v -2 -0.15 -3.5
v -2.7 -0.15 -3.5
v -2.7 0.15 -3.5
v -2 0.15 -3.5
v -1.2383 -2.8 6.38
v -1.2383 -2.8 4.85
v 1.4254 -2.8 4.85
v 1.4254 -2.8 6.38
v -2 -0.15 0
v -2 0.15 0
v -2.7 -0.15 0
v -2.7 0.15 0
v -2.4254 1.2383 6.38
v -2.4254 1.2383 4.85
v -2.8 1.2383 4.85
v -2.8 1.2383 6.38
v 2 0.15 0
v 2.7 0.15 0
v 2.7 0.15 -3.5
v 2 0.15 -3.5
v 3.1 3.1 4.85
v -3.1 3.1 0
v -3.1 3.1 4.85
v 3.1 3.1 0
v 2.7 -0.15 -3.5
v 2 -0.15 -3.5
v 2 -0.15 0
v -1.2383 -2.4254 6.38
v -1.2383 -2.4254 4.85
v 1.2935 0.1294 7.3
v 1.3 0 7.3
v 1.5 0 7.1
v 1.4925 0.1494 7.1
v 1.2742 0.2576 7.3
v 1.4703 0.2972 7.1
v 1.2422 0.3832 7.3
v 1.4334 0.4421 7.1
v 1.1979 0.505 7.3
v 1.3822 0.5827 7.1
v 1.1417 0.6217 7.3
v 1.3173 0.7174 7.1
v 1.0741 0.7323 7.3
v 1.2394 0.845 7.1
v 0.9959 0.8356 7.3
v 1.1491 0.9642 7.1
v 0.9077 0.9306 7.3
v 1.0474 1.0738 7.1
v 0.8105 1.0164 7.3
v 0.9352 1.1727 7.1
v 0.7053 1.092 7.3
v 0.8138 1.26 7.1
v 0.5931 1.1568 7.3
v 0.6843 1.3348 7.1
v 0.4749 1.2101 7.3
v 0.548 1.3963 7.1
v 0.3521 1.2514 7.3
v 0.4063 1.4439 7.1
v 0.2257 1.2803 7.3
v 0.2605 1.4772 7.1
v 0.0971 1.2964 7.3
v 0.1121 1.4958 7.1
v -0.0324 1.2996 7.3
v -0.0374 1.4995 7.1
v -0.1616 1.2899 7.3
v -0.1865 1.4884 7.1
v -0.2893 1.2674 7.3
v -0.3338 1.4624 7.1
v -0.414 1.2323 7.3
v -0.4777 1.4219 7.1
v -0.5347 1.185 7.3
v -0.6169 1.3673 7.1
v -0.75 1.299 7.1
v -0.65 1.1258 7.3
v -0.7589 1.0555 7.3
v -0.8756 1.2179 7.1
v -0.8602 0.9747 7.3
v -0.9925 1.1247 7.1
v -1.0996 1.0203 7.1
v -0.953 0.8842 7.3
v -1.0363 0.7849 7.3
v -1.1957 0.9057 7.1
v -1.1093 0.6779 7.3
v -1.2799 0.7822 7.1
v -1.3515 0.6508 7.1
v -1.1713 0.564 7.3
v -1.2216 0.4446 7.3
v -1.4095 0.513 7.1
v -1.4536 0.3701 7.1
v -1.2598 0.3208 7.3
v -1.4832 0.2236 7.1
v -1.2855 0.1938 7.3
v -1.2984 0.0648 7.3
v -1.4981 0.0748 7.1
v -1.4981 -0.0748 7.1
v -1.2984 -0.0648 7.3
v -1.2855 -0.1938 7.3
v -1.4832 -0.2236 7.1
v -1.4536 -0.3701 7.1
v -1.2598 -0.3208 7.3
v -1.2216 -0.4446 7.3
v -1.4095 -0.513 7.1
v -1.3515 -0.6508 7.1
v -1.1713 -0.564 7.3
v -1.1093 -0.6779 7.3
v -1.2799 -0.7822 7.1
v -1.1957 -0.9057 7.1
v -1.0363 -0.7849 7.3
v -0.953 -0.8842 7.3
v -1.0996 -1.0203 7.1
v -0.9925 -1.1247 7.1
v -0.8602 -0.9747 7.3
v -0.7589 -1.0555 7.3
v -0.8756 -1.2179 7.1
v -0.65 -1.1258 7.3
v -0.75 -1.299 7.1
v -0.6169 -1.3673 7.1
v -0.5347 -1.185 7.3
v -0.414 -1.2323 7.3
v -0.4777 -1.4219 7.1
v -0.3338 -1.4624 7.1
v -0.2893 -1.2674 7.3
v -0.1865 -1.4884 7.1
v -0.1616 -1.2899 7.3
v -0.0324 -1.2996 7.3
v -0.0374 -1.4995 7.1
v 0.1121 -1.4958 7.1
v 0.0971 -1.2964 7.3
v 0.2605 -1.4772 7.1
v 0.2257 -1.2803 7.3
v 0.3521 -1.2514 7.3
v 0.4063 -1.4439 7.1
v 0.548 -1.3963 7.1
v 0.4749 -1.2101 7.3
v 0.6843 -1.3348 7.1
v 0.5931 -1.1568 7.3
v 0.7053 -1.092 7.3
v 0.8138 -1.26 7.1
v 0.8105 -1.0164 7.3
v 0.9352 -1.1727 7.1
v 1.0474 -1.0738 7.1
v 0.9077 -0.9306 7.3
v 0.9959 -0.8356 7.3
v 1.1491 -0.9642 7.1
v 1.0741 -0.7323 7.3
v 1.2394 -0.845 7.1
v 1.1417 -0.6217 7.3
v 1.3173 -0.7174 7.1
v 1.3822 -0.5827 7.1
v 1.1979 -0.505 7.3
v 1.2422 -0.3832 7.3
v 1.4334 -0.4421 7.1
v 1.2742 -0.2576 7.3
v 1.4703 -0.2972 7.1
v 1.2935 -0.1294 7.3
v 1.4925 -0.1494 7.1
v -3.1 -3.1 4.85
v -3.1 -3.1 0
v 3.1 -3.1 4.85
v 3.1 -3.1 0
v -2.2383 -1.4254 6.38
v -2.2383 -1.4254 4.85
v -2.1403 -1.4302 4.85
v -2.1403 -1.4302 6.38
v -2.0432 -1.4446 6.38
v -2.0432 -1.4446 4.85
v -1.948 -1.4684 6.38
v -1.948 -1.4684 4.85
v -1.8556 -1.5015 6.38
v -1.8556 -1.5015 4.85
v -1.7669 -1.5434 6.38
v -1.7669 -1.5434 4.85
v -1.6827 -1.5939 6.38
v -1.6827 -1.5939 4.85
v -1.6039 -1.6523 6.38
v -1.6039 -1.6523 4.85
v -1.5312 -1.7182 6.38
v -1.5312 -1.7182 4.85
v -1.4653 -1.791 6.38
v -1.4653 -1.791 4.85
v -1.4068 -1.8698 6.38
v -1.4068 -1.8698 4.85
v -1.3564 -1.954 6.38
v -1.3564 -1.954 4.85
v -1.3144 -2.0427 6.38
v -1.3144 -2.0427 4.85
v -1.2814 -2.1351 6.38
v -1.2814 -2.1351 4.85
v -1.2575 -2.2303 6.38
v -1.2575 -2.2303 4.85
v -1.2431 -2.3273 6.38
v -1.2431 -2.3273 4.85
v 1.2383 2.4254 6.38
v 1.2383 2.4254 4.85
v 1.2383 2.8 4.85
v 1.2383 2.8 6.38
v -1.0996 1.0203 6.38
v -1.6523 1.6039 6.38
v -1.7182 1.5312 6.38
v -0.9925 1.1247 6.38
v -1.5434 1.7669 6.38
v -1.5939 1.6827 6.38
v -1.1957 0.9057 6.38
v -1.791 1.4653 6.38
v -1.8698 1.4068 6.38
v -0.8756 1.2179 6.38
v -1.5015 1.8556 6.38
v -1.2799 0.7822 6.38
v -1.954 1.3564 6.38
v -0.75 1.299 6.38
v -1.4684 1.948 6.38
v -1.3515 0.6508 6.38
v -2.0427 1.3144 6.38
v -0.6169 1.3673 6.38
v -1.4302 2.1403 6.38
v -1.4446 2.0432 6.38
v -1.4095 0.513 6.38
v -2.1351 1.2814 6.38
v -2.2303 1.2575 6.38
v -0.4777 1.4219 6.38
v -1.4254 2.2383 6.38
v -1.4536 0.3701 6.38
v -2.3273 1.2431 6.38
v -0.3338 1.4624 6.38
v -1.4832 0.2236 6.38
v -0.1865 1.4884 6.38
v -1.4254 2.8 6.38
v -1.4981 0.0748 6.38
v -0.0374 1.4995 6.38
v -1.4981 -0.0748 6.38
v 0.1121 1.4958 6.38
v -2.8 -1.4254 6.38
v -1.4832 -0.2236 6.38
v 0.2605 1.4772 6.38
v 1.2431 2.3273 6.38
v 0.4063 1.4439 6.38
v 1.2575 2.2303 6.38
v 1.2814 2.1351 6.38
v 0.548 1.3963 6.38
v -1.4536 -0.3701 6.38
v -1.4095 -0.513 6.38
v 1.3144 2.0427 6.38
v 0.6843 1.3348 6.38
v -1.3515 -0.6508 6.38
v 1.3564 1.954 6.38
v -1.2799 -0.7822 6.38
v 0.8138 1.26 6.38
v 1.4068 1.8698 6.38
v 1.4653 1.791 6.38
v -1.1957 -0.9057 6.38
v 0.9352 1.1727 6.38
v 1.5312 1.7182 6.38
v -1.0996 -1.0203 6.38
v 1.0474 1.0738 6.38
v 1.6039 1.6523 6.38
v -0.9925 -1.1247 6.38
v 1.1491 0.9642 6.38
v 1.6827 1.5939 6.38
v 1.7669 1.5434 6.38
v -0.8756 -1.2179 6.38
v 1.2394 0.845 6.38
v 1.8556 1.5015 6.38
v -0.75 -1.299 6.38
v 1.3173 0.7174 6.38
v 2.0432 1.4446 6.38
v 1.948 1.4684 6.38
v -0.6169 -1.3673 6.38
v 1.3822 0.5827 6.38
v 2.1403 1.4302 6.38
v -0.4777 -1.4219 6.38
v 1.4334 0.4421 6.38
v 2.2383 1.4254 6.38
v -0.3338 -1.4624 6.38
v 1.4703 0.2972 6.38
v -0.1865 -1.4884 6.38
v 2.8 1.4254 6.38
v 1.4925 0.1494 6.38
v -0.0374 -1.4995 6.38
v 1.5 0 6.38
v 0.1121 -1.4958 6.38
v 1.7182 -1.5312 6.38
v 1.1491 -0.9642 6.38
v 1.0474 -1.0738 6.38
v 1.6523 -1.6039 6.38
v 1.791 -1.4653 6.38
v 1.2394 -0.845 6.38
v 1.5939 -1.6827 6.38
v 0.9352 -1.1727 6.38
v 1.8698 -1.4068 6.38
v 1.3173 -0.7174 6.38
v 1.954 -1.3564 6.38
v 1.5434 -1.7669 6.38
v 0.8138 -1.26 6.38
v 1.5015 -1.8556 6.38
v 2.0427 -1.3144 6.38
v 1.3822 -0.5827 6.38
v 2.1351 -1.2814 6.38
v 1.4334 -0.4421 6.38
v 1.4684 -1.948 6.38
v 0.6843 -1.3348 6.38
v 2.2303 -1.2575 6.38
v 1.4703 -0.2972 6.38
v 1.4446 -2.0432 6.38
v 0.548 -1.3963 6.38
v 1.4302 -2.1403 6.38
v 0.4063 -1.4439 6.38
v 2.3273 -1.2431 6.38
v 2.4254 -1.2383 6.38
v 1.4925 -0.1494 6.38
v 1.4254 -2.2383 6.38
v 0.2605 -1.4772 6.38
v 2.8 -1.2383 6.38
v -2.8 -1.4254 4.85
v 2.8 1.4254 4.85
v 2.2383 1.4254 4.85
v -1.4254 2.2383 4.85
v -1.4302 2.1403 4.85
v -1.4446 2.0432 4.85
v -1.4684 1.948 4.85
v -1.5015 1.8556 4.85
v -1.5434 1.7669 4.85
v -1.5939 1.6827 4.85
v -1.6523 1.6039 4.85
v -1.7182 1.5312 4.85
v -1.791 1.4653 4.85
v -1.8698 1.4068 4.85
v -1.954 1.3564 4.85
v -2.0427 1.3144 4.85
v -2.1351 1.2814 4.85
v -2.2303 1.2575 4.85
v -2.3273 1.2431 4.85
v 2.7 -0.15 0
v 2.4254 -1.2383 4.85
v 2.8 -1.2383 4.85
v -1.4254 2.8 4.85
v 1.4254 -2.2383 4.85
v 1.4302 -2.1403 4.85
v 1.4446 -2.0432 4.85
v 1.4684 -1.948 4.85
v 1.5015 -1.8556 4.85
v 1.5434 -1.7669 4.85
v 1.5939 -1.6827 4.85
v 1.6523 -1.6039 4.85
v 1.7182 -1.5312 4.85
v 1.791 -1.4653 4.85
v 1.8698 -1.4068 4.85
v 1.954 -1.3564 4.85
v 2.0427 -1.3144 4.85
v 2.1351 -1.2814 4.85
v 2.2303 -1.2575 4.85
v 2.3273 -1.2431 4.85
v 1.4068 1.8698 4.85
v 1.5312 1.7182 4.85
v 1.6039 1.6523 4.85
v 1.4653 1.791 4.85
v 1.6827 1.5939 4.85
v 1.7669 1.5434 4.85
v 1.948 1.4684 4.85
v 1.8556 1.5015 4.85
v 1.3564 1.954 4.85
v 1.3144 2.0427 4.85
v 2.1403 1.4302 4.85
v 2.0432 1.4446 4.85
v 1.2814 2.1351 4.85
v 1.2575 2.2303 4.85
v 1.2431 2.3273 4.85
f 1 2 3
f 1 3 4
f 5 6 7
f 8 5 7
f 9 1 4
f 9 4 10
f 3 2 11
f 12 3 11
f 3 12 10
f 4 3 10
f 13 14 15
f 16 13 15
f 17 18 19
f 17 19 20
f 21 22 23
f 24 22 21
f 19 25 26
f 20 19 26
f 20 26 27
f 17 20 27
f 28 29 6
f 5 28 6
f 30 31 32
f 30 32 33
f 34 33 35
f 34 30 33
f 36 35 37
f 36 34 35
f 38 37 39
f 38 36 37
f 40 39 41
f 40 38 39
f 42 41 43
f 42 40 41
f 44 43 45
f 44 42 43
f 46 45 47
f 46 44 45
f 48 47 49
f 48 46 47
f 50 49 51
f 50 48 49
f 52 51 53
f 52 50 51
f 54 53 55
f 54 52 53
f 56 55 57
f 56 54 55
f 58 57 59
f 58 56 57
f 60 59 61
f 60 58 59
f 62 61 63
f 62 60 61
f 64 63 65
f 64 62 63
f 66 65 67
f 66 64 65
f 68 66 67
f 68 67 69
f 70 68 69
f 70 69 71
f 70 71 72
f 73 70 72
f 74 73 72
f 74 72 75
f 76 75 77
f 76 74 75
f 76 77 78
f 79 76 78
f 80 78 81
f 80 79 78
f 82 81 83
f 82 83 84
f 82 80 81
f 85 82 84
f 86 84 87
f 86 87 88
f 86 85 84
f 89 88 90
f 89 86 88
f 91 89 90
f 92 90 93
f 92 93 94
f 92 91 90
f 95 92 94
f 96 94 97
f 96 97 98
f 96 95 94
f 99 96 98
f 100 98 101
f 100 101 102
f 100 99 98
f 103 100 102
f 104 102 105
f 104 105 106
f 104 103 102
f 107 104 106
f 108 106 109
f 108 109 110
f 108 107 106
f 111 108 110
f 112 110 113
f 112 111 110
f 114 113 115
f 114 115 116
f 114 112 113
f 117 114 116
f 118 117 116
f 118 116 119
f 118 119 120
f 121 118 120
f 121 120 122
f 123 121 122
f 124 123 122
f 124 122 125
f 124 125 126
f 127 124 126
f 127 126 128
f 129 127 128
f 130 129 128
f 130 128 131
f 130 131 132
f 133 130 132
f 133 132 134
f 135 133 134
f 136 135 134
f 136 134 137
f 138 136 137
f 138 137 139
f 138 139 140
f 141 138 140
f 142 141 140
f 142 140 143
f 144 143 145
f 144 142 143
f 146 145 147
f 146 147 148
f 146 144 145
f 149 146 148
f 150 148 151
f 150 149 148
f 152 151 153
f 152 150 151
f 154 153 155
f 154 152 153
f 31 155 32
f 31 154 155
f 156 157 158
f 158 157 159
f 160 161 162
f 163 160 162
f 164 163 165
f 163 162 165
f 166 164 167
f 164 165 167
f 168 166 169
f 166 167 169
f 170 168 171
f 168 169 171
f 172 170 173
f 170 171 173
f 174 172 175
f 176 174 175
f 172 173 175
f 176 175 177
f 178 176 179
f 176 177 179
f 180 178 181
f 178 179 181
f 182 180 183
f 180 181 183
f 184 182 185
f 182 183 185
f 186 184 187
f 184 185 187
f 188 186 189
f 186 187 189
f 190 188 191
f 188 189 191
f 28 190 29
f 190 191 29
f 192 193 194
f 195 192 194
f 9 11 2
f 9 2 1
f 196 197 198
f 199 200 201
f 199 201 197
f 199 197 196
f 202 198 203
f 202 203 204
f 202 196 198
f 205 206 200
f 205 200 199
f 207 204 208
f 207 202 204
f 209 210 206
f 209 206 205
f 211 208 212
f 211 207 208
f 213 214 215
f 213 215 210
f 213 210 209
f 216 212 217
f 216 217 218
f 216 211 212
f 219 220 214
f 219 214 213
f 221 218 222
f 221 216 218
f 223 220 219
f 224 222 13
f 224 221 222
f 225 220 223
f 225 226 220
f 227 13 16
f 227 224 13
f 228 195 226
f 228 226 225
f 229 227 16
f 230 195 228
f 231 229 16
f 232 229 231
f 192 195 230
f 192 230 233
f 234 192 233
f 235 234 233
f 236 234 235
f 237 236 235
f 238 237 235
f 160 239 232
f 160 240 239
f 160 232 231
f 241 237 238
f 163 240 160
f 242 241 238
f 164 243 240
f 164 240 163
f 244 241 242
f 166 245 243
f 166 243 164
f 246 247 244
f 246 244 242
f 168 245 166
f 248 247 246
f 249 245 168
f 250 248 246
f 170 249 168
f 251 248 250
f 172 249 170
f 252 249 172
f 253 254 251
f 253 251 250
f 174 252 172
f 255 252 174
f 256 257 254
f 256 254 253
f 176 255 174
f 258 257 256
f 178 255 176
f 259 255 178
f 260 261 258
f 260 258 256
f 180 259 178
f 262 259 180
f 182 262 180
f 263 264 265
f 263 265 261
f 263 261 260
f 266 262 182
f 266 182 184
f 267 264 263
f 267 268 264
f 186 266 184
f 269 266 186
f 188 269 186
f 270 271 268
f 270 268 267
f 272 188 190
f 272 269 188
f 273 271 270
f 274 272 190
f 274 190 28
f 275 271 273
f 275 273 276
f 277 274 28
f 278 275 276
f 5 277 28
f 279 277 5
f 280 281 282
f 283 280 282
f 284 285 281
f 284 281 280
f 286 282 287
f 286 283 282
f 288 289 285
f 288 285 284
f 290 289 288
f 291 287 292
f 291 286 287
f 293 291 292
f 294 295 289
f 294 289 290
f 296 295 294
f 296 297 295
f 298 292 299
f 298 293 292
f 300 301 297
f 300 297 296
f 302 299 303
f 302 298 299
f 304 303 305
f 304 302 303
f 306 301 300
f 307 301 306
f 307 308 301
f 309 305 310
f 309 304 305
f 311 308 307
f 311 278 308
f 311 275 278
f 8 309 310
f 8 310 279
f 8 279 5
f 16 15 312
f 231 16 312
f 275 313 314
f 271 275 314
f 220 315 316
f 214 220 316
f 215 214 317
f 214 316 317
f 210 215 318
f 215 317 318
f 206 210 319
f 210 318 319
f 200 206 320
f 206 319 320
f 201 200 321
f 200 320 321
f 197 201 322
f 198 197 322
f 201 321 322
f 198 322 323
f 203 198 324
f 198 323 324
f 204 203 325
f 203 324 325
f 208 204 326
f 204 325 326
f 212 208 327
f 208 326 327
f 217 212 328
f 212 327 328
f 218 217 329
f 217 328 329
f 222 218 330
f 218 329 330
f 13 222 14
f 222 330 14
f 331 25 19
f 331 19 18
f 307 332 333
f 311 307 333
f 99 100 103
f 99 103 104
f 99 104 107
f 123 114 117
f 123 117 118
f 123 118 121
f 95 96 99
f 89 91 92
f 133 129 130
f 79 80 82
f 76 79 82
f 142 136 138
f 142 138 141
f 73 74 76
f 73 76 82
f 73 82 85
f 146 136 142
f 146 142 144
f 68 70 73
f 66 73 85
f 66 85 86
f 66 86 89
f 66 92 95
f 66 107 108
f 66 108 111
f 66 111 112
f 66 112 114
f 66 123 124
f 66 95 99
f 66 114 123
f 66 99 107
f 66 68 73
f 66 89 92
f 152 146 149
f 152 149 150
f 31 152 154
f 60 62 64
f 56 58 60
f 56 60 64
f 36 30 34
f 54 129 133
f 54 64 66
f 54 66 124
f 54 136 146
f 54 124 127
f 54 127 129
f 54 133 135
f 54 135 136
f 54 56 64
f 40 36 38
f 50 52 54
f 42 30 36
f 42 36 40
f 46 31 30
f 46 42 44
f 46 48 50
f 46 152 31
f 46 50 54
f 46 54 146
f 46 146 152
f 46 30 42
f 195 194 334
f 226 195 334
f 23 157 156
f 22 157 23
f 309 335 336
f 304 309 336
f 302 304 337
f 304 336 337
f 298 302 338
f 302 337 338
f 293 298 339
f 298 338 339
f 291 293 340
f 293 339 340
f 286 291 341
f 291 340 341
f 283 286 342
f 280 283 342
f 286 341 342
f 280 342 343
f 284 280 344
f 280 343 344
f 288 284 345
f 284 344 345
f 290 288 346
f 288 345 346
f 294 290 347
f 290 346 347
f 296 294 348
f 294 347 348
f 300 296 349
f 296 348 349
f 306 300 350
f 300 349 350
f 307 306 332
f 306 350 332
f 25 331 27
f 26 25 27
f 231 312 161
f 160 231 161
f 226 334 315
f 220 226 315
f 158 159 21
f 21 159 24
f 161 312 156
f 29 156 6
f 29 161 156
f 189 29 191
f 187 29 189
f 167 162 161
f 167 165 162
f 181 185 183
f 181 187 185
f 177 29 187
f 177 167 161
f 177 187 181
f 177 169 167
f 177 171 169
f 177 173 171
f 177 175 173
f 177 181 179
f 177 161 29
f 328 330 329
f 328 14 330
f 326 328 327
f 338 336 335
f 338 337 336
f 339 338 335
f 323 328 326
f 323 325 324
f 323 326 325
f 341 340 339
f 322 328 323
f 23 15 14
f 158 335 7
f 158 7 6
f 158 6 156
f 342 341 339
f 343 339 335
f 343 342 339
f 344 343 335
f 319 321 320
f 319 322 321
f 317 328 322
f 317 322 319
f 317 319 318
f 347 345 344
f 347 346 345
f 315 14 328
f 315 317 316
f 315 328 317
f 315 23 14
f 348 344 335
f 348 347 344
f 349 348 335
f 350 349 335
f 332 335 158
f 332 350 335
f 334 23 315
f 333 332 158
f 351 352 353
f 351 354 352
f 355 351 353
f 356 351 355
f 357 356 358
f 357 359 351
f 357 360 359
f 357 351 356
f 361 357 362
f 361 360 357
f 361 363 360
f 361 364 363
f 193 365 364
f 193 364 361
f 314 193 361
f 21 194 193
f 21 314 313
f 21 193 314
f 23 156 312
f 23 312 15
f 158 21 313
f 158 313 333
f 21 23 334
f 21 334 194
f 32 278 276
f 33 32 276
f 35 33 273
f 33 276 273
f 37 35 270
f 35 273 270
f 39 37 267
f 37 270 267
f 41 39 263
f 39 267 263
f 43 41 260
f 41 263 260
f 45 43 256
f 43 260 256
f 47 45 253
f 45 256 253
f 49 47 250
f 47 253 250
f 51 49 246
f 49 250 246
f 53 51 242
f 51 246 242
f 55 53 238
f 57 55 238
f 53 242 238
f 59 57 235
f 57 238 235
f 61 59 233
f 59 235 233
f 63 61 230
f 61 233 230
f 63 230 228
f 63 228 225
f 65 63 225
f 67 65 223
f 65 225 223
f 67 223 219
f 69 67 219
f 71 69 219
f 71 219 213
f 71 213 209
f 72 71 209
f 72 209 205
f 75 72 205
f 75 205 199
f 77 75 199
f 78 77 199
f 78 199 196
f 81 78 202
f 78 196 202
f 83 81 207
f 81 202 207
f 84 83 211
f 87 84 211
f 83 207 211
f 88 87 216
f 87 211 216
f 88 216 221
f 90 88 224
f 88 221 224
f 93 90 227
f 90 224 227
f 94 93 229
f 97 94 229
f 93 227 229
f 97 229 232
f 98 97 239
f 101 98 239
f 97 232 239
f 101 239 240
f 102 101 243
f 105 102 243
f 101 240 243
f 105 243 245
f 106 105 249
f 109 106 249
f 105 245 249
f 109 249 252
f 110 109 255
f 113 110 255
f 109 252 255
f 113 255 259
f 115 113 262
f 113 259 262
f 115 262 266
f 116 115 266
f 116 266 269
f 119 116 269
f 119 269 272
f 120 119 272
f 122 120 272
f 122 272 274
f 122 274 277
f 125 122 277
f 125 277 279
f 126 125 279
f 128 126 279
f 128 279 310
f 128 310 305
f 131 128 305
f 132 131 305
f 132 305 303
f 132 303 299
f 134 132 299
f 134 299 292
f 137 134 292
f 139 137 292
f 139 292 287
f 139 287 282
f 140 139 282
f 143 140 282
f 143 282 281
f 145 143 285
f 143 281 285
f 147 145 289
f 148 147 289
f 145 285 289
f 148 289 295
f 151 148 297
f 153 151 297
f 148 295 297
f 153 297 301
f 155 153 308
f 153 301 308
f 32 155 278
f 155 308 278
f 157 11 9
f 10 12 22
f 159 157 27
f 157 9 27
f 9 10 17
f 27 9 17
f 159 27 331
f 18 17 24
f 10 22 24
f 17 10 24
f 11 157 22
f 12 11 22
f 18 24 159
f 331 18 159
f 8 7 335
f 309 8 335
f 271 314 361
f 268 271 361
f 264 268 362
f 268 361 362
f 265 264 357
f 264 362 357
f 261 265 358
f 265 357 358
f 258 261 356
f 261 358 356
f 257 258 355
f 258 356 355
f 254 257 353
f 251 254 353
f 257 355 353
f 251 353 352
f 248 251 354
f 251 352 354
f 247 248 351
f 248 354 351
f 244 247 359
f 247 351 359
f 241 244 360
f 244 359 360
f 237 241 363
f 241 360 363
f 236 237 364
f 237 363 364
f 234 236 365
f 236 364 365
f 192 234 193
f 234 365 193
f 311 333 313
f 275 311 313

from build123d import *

# Parameters (mm, degrees)
F0_W            = 6.2
F0_H            = 6.2
F1_DEPTH        = 4.85
F3_DEPTH        = 1.53
F3_COPIES_COUNT = 4
F4_R            = 1.5
F5_DEPTH        = 0.92
F6_SIZE         = 0.2
F7_W            = 0.7
F7_H            = 3.5
F8_DEPTH        = 0.15


# Not quite as in the source:
# - a pattern or mirror of a feature is missing from the dataset's text; its kind, count and spacing are read off the source's solid


with BuildPart() as f1:
    # F0 (on Top) → F1 (new body)
    with BuildSketch(Plane.XY):
        Rectangle(F0_W, F0_H)
    extrude(amount=F1_DEPTH)

    # F2 (on face) → F3 (join)
    with BuildSketch(Plane.XY.offset(4.85)):
        with BuildLine():
            Line((1.2382979223, 2.8), (0, 2.8))
            Line((0, 2.8), (0, 0))
            Line((0, 0), (2.8, 0))
            Line((2.8, 0), (2.8, 1.4253550908))
            Line((2.8, 1.4253550908), (2.2382979223, 1.4253550908))
            ThreePointArc((2.2382979223, 1.4253550908), (1.5311911411, 1.7182483096), (1.2382979223, 2.4253550908))
            Line((1.2382979223, 2.4253550908), (1.2382979223, 2.8))
        make_face()
    f3 = extrude(amount=F3_DEPTH)

    # F3_copies: F3 ×4 about axis
    f3_copies_axis = Axis((0, 0, 0), (0, 0, 1))
    for i in range(1, F3_COPIES_COUNT):
        add(f3.rotate(f3_copies_axis, i * 360 / F3_COPIES_COUNT))

    # F4 (on face) → F5 (join)
    with BuildSketch(Plane.XY.offset(6.38)):
        Circle(F4_R)
    extrude(amount=F5_DEPTH)

    # F6
    f6_edges = [f1.edges().sort_by_distance(p)[0] for p in [
        (-1.5, 0, 7.3),
    ]]
    chamfer(f6_edges, length=F6_SIZE)

    # F7 (on Front) → F8 (join, symmetric)
    with BuildSketch(Plane.XZ):
        with Locations((-2.35, -1.75)):
            Rectangle(F7_W, F7_H)
    f8 = extrude(amount=F8_DEPTH, both=True)

    # F8_copies: F8 across plane
    add(f8.mirror(Plane(origin=(0, 0, 0), x_dir=(0, 0, 1), z_dir=(1, 0, 0))))


solid = f1.part
